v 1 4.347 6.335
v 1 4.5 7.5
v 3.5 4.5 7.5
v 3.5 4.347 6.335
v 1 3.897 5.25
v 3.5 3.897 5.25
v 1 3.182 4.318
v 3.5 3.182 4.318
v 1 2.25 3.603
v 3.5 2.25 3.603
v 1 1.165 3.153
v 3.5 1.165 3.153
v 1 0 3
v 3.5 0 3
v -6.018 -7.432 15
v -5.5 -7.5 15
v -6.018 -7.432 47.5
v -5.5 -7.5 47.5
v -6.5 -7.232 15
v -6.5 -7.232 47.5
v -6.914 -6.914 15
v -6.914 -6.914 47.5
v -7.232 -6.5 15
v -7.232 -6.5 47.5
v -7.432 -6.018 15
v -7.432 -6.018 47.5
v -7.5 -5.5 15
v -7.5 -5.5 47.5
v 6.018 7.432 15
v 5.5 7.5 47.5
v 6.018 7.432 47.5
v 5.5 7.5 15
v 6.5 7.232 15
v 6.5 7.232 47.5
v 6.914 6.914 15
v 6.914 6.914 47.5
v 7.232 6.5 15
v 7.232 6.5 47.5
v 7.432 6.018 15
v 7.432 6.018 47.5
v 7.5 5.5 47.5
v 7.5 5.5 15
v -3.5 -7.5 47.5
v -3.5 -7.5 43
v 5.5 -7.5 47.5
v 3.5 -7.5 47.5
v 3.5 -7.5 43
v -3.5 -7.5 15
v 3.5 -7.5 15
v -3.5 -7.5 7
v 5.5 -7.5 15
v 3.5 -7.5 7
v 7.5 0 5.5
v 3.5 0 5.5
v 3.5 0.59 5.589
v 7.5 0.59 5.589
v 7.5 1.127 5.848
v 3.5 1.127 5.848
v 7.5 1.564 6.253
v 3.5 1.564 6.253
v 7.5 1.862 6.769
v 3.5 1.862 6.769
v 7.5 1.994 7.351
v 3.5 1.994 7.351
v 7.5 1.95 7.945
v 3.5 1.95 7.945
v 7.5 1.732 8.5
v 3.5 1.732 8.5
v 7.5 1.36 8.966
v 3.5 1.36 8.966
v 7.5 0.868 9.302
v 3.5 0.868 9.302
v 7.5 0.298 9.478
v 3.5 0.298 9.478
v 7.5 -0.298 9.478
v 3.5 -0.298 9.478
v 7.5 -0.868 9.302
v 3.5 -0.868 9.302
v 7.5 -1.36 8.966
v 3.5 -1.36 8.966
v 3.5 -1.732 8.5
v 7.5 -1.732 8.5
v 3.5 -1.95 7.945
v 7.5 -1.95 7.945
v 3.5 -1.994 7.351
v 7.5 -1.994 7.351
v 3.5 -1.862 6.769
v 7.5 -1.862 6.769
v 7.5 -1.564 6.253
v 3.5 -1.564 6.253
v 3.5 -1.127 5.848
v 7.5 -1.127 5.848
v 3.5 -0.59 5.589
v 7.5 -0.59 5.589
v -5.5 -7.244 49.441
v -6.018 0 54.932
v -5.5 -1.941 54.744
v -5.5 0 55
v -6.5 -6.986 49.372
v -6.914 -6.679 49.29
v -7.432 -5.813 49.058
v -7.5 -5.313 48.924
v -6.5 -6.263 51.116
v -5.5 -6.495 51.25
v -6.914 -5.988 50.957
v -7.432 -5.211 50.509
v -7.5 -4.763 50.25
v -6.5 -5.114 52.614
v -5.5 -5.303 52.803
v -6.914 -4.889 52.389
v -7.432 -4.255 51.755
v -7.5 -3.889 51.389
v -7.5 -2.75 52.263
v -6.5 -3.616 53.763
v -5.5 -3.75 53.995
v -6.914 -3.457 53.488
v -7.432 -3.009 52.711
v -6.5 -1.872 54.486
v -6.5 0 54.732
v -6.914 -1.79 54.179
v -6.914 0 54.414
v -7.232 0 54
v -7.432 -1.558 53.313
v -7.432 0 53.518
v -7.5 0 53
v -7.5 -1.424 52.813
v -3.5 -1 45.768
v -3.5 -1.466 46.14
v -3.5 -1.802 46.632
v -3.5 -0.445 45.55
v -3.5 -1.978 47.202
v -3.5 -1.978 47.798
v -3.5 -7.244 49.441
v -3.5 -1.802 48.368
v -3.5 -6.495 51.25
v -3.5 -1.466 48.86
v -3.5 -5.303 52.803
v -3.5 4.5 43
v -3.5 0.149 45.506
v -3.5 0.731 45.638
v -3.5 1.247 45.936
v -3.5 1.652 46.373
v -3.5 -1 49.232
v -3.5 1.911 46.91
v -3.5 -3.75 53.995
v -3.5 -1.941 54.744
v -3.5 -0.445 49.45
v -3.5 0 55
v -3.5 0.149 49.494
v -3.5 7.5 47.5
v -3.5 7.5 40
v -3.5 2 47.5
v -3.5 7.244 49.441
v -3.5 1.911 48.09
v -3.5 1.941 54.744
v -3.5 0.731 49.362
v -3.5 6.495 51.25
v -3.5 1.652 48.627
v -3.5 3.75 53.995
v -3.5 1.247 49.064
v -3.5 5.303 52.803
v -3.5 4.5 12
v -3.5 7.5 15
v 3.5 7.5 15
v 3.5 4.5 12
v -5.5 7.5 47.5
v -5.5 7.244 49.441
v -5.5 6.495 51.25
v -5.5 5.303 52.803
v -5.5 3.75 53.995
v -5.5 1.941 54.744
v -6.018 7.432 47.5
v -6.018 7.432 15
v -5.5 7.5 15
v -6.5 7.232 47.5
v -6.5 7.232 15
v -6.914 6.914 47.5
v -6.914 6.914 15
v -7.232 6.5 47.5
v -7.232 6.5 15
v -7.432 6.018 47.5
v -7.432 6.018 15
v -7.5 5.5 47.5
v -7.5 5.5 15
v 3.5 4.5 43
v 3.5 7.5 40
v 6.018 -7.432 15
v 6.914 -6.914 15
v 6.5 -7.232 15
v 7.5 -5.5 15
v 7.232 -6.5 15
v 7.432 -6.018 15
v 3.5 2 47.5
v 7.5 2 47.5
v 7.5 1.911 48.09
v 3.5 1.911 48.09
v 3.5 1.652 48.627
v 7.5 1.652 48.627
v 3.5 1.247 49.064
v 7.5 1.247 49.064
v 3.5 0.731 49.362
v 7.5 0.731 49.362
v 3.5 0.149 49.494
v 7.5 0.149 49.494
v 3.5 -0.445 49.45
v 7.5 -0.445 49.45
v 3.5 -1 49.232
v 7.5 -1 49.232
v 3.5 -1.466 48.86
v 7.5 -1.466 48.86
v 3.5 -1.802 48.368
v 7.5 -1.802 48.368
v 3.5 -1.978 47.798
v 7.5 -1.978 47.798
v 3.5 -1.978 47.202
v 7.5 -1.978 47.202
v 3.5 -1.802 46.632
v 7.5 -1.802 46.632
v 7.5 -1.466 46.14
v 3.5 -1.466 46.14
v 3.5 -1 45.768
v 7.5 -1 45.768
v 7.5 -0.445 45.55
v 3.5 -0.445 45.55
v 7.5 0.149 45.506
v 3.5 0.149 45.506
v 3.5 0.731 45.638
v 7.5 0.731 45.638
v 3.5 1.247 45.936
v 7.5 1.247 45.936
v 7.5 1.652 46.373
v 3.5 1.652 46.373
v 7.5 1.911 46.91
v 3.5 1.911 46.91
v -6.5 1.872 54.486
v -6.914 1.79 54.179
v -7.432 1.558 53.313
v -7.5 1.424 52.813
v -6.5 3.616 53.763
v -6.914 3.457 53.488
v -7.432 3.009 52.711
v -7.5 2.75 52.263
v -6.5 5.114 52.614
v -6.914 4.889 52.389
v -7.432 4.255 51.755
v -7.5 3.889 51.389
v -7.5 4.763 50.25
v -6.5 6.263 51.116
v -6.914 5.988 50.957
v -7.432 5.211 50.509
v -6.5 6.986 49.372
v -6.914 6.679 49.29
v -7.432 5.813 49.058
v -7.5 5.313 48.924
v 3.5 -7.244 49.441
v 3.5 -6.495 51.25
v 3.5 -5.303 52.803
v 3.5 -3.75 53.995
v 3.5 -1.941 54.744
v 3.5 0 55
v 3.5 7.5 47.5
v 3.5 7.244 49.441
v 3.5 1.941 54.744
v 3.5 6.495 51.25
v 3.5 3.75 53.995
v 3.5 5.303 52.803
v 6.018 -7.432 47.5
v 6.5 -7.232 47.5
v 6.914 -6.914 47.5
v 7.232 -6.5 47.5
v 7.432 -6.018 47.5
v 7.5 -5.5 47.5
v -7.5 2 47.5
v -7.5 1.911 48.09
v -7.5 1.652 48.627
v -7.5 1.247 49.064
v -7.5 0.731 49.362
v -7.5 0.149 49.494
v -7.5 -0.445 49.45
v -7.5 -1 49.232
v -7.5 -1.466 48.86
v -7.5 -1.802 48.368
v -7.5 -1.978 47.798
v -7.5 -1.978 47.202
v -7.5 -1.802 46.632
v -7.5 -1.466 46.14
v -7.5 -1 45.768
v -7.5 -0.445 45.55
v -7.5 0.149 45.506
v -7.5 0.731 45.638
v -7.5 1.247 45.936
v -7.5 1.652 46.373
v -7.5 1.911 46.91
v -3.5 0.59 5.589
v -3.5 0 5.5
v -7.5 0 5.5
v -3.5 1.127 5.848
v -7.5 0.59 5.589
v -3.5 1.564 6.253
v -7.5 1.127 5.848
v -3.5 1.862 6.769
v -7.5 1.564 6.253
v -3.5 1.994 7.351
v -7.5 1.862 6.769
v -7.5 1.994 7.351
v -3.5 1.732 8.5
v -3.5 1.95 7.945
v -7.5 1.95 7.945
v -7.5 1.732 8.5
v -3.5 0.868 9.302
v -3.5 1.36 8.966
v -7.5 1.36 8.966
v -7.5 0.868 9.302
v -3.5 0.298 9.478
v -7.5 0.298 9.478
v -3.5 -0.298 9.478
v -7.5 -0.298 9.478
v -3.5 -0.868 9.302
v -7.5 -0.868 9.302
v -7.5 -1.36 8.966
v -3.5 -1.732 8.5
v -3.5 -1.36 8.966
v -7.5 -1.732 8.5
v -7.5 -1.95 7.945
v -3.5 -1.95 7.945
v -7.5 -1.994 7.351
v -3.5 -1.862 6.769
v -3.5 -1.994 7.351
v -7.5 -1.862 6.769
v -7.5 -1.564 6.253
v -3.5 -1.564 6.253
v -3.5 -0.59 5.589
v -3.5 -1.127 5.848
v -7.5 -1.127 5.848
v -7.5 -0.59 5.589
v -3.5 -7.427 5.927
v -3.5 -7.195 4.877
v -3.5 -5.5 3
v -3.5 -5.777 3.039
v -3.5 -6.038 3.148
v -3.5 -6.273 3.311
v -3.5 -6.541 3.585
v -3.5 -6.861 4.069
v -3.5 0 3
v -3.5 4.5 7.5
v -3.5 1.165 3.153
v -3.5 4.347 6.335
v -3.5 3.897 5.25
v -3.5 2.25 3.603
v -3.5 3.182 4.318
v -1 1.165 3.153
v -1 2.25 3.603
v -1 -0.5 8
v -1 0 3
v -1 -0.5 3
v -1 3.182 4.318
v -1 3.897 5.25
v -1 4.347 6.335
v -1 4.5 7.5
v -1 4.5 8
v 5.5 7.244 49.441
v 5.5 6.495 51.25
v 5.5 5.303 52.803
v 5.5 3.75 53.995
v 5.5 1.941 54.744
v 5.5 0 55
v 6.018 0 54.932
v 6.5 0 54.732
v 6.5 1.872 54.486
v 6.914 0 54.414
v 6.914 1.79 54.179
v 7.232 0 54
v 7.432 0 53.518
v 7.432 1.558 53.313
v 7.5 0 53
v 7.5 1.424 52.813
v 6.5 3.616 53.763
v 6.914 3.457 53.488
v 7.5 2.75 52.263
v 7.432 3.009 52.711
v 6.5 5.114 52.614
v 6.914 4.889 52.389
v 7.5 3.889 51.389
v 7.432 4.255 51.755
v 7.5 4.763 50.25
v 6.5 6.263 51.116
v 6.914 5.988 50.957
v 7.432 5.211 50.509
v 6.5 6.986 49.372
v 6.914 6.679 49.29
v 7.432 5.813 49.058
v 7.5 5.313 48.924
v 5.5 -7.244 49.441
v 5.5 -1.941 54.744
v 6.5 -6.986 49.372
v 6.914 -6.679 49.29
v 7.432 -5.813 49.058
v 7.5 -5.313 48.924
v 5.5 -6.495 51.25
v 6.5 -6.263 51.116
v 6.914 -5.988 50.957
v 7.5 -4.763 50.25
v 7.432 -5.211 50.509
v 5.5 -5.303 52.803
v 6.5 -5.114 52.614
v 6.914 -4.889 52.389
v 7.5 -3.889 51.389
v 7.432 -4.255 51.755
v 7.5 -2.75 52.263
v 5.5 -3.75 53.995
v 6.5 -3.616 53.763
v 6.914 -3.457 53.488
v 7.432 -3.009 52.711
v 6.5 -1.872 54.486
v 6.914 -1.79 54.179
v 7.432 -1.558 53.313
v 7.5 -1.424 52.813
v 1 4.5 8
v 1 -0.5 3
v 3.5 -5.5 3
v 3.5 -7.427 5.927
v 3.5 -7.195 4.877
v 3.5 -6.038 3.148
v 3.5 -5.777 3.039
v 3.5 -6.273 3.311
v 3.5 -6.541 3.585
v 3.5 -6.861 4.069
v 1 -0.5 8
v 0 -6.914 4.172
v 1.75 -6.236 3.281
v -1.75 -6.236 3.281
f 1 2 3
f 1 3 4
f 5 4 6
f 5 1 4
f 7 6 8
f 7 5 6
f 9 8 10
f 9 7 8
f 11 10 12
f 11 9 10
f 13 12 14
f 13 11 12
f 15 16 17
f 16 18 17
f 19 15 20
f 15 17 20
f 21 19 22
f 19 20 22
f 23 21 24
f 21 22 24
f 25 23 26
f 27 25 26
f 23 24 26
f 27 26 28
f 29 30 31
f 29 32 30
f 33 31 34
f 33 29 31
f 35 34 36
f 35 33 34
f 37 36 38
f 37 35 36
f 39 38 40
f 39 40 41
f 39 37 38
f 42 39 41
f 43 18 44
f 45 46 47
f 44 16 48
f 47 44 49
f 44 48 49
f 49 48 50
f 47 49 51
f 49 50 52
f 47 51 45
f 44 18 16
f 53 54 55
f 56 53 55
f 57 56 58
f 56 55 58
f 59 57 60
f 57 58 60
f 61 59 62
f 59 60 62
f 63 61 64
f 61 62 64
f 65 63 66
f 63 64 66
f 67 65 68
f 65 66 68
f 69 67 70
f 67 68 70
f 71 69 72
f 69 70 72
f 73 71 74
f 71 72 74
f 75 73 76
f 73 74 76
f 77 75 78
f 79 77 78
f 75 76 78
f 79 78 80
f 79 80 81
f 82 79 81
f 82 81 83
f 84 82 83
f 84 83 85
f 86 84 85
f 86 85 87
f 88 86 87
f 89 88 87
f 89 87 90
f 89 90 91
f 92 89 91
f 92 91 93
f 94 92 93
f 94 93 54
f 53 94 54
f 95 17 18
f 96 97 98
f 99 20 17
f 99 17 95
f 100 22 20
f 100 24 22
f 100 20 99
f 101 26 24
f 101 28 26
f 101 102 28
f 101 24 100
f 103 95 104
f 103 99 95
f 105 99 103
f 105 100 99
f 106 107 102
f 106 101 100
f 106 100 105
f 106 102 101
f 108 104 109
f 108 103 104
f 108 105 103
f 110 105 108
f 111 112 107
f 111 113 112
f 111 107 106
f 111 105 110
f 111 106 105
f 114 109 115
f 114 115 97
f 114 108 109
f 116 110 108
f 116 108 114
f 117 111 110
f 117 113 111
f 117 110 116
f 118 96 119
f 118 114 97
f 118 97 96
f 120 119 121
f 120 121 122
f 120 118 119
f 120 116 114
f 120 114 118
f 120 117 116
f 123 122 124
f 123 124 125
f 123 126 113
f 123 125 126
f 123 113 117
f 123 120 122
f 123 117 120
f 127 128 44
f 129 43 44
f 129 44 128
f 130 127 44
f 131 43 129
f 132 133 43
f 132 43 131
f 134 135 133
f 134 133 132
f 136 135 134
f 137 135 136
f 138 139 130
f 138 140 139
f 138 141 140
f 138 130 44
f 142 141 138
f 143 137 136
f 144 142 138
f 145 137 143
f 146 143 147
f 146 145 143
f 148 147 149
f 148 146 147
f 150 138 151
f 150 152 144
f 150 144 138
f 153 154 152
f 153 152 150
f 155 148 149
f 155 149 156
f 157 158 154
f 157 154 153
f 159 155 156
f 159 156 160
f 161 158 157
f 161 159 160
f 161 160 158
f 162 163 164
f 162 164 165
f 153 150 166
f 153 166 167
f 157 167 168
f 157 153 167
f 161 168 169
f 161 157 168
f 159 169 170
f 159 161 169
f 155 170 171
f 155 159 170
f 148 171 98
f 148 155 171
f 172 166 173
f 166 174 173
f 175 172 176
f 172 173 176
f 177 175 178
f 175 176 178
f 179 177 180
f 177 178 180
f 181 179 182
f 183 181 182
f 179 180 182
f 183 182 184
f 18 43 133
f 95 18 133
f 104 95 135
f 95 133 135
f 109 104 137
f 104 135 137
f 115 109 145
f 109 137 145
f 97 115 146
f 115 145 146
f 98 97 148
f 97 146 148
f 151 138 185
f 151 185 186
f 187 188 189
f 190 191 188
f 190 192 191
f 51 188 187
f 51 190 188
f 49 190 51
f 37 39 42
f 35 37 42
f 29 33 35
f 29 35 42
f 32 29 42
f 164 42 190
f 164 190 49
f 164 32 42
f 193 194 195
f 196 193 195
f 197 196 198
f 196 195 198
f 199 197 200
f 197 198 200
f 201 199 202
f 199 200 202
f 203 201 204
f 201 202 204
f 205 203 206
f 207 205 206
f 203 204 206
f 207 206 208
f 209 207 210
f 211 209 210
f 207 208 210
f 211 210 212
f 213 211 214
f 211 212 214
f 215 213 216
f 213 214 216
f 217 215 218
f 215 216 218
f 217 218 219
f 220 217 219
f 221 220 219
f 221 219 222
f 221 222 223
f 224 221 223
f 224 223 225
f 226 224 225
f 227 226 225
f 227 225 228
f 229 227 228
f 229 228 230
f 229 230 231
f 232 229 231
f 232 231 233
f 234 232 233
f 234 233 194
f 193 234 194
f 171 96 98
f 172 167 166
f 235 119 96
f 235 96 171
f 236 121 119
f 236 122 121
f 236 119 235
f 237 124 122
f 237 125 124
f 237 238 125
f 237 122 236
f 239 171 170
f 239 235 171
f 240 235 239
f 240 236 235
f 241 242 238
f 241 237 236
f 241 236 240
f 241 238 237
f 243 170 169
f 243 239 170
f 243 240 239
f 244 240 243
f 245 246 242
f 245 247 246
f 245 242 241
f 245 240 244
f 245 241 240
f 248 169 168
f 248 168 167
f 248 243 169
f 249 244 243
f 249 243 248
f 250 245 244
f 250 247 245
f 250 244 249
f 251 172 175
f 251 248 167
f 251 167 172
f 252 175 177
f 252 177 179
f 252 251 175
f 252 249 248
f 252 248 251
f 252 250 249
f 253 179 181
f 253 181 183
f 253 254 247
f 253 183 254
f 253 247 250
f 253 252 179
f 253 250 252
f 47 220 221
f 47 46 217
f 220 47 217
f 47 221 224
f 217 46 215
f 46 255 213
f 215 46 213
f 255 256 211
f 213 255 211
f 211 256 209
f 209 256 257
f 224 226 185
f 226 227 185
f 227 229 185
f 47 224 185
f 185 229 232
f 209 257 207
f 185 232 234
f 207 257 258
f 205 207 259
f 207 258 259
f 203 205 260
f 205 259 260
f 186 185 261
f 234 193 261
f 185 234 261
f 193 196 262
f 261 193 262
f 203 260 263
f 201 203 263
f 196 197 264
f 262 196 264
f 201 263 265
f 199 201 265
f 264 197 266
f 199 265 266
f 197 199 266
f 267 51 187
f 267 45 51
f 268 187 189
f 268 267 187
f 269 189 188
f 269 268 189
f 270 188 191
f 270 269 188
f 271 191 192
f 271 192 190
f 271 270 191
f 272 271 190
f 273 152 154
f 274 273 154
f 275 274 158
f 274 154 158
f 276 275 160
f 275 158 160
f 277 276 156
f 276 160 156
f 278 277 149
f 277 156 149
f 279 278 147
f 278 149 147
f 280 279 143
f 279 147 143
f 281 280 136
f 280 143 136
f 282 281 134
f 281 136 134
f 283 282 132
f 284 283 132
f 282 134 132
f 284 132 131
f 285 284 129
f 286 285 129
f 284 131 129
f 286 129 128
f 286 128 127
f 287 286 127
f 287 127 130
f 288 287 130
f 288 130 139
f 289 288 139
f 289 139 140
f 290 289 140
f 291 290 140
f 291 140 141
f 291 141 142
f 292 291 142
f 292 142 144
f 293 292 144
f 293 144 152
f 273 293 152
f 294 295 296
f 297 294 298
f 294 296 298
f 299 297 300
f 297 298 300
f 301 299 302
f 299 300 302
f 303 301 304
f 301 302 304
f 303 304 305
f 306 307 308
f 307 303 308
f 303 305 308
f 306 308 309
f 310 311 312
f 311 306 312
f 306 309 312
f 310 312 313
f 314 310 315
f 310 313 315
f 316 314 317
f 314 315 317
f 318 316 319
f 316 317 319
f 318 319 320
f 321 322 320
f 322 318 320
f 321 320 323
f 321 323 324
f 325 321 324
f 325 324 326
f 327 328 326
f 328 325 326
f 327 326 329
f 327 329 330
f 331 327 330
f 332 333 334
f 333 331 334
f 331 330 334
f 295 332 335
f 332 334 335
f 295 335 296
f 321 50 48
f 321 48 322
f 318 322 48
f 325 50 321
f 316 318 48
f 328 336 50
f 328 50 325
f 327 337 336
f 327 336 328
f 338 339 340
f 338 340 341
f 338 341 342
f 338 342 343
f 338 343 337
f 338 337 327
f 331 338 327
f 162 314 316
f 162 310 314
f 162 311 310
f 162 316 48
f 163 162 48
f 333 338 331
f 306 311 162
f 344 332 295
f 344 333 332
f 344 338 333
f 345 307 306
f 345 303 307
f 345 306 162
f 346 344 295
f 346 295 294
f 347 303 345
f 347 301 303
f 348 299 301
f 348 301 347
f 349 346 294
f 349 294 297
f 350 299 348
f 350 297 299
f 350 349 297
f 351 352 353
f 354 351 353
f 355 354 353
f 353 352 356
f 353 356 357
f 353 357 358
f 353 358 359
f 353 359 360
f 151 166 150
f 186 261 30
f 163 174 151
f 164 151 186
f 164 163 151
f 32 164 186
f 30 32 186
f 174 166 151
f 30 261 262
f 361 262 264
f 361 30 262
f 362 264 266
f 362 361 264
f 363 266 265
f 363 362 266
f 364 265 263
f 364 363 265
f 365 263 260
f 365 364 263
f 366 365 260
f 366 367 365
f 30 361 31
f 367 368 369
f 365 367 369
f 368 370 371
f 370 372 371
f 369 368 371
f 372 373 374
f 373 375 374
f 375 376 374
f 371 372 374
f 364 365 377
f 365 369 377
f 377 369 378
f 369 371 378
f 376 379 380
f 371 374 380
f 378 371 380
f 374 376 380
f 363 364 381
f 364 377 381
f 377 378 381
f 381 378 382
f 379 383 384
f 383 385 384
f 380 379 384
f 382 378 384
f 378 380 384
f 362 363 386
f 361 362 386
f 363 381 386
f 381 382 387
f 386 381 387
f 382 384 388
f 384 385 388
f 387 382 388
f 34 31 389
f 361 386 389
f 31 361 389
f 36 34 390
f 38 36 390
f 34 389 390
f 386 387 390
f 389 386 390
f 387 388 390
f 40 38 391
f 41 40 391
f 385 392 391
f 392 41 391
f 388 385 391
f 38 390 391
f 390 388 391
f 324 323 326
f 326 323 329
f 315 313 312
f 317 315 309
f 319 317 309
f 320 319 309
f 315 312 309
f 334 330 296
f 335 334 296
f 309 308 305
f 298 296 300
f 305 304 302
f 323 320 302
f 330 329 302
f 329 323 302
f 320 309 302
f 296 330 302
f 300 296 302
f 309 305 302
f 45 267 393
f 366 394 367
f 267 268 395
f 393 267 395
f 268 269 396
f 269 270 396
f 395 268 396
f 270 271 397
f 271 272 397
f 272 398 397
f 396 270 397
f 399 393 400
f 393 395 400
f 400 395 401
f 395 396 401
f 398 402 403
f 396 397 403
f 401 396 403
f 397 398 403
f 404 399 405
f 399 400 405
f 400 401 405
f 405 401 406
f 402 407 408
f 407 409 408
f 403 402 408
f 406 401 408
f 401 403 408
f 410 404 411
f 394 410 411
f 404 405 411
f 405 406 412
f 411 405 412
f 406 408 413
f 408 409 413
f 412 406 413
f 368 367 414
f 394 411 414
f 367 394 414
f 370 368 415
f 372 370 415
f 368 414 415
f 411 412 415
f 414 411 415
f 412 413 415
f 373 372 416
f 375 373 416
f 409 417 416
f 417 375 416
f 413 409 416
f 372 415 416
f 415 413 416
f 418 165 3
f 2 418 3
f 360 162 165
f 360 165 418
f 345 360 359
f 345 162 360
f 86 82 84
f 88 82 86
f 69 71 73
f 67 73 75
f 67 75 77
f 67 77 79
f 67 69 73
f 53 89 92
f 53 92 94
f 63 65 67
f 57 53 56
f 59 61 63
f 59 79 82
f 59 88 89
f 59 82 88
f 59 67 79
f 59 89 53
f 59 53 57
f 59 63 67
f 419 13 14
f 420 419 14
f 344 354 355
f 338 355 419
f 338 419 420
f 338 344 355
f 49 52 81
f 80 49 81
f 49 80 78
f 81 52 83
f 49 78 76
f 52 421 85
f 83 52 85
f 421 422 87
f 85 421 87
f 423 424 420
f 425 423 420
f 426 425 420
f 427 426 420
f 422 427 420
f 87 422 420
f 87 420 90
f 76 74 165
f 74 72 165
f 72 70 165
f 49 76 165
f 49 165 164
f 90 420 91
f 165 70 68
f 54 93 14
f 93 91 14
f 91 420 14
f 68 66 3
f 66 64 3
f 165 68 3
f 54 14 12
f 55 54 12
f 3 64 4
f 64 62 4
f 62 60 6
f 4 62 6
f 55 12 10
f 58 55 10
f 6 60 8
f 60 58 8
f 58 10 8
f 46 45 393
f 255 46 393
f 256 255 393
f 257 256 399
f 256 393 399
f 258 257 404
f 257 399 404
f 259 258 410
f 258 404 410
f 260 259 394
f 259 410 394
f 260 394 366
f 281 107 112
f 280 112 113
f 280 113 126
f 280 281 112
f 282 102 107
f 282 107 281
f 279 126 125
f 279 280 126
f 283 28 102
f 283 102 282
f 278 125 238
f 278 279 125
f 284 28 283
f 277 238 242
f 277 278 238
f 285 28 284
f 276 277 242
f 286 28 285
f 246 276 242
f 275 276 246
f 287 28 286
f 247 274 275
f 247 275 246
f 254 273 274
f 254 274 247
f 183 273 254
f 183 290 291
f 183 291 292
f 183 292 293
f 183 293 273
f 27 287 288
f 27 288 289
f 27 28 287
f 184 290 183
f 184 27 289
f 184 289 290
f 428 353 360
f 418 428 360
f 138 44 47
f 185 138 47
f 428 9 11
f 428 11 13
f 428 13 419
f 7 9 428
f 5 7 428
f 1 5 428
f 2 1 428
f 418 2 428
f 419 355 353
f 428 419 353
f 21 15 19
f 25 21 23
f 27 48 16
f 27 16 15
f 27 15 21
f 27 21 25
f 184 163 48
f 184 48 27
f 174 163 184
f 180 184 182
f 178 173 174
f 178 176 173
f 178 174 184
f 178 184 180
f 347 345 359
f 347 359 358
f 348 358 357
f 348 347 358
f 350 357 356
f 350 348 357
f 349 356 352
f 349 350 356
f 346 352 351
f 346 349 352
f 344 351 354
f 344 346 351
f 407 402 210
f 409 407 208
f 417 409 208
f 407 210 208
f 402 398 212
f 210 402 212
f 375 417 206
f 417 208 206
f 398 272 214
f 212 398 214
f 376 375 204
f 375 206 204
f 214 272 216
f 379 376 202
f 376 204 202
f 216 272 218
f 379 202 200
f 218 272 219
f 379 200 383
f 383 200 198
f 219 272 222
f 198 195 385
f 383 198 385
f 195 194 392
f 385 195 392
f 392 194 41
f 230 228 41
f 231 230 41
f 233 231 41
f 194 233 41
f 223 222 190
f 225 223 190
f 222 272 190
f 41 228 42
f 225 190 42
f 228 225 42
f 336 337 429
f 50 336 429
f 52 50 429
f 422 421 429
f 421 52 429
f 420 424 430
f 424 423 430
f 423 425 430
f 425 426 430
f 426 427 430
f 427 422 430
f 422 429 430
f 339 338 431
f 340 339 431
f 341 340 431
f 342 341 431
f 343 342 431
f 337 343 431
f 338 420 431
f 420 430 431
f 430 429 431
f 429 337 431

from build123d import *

# Parameters (mm, degrees)
SKETCH1_W                = 15
SKETCH1_H                = 15
BOSS_EXTRUDE1_DEPTH      = 55
SKETCH3_W                = 7
SKETCH3_H                = 15
CUT_EXTRUDE1_DEPTH       = 12
SKETCH4_R                = 2
CUT_EXTRUDE2_DEPTH       = 15
SKETCH5_W                = 4
SKETCH5_H                = 15
CUT_EXTRUDE3_DEPTH       = 15
BOSS_EXTRUDE2_DEPTH      = 7.5
BOSS_EXTRUDE2_DEPTH_BACK = 7.5
SKETCH6_R                = 2
FILLET1_R                = 7.5
CUT_EXTRUDE6_DEPTH       = 3.5
CUT_EXTRUDE6_DEPTH_BACK  = 3.5
FILLET2_R                = 2
CUT_EXTRUDE7_DEPTH       = 7.5
CUT_EXTRUDE7_DEPTH_BACK  = 7.5
FILLET3_SIZE             = 4
FILLET3_SIZE_2           = 2
CUT_EXTRUDE8_DEPTH       = 1
CUT_EXTRUDE8_DEPTH_BACK  = 1


# Some blends are built 0.0001 mm under size
with BuildPart() as part:
    # Sketch1 → Boss-Extrude1 (new body)
    with BuildSketch(Plane.XY):
        Rectangle(SKETCH1_W, SKETCH1_H)
    extrude(amount=BOSS_EXTRUDE1_DEPTH)

    # Sketch3 → Cut-Extrude1 (cut)
    with BuildSketch(Plane.XY.offset(55)):
        Rectangle(SKETCH3_W, SKETCH3_H)
    extrude(amount=-CUT_EXTRUDE1_DEPTH, mode=Mode.SUBTRACT)

    # Sketch4 → Cut-Extrude2 (cut)
    with BuildSketch(Plane(origin=(7.5, 0, 0), x_dir=(0, 0, -1), z_dir=(1, 0, 0))):
        with Locations(Location((-47.5, 0, 0), (0, 0, 90))):
            Circle(SKETCH4_R)
    extrude(amount=-CUT_EXTRUDE2_DEPTH, mode=Mode.SUBTRACT)

    # Sketch5 → Cut-Extrude3 (cut)
    with BuildSketch(Plane(origin=(0, 0, 0), x_dir=(-1, 0, 0), z_dir=(0, 0, -1))):
        with Locations((-5.5, 0)):
            Rectangle(SKETCH5_W, SKETCH5_H)
        with Locations((5.5, 0)):
            Rectangle(SKETCH5_W, SKETCH5_H)
    extrude(amount=-CUT_EXTRUDE3_DEPTH, mode=Mode.SUBTRACT)

    # Sketch6 → Boss-Extrude2 (add, two sides: drawn at the far end of the back side and taken through both)
    with BuildSketch(Plane(origin=(0, 0, 0), x_dir=(0, 0, -1), z_dir=(1, 0, 0)).offset(-BOSS_EXTRUDE2_DEPTH_BACK)):
        with Locations((-7.5, 0)):
            Circle(SKETCH6_R)
    extrude(amount=BOSS_EXTRUDE2_DEPTH + BOSS_EXTRUDE2_DEPTH_BACK)

    # Fillet1
    fillet1_edges = [part.edges().sort_by_distance(p)[0] for p in [
        (5.5, -7.5, 55),
        (-5.5, -7.5, 55),
        (-5.5, 7.5, 55),
        (5.5, 7.5, 55),
    ]]
    fillet(fillet1_edges, radius=FILLET1_R - 0.0001)  # a hair under: the kernel refuses the full size

    # Sketch7 → Cut-Extrude6 (cut, two sides: drawn at the far end of the back side and taken through both)
    with BuildSketch(Plane(origin=(0, 0, 0), x_dir=(0, 0, -1), z_dir=(1, 0, 0)).offset(-CUT_EXTRUDE6_DEPTH_BACK)):
        Polygon((-43, 7.5), (-43, 4.5), (-40, 7.5), align=None)
    extrude(amount=CUT_EXTRUDE6_DEPTH + CUT_EXTRUDE6_DEPTH_BACK, mode=Mode.SUBTRACT)

    # Fillet2
    fillet2_edges = [part.edges().sort_by_distance(p)[0] for p in [
        (7.5, -7.5, 31.25005),
        (7.5, 7.5, 31.25005),
        (7.5, 5.303330148, 52.803330148),
        (7.5, -5.303330148, 52.803330148),
        (-7.5, -7.5, 31.25005),
        (-7.5, 7.5, 31.25005),
        (-7.5, 5.303330148, 52.803330148),
        (-7.5, -5.303330148, 52.803330148),
    ]]
    fillet(fillet2_edges, radius=FILLET2_R)

    # Sketch8 → Cut-Extrude7 (cut, two sides: drawn at the far end of the back side and taken through both)
    with BuildSketch(Plane(origin=(0, 0, 0), x_dir=(0, 0, -1), z_dir=(1, 0, 0)).offset(-CUT_EXTRUDE7_DEPTH_BACK)):
        with BuildLine():
            Line((-15, 7.5), (-12, 4.5))
            Line((-12, 4.5), (-7.5, 4.5))
            ThreePointArc((-7.5, 4.5), (-4.318019485, 3.181980515), (-3, 0))
            Line((-3, 0), (-3, -7.5))
            Line((-3, -7.5), (0, -7.5))
            Line((0, -7.5), (0, 7.5))
            Line((0, 7.5), (-15, 7.5))
        make_face()
    extrude(amount=CUT_EXTRUDE7_DEPTH + CUT_EXTRUDE7_DEPTH_BACK, mode=Mode.SUBTRACT)

    # Fillet3
    # an asymmetric fillet: 4, 2 mm, written as the material it takes off along each edge
    with BuildSketch(Plane(origin=(-13.5, -7.5, 3), x_dir=(0, 0, 1), z_dir=(1, 0, 0))) as fillet3_piece_1:
        with BuildLine():
            Bezier((FILLET3_SIZE, 0), (0, 0), (0, -FILLET3_SIZE_2), weights=[1, 0.707106781, 1])
            Line((0, -FILLET3_SIZE_2), (0, 0))
            Line((0, 0), (FILLET3_SIZE, 0))
        make_face()
    extrude(amount=27, mode=Mode.SUBTRACT)

    # Sketch9 → Cut-Extrude8 (cut, two sides: drawn at the far end of the back side and taken through both)
    with BuildSketch(Plane(origin=(0, 0, 0), x_dir=(0, 0, -1), z_dir=(1, 0, 0)).offset(-CUT_EXTRUDE8_DEPTH_BACK)):
        with BuildLine():
            Line((-8, -0.5), (-8, 9.147620524))
            ThreePointArc((-8, 9.147620524), (-1.178102105, 6.321897895), (1.647620524, -0.5))
            Line((1.647620524, -0.5), (-8, -0.5))
        make_face()
    extrude(amount=CUT_EXTRUDE8_DEPTH + CUT_EXTRUDE8_DEPTH_BACK, mode=Mode.SUBTRACT)


solid = part.part
